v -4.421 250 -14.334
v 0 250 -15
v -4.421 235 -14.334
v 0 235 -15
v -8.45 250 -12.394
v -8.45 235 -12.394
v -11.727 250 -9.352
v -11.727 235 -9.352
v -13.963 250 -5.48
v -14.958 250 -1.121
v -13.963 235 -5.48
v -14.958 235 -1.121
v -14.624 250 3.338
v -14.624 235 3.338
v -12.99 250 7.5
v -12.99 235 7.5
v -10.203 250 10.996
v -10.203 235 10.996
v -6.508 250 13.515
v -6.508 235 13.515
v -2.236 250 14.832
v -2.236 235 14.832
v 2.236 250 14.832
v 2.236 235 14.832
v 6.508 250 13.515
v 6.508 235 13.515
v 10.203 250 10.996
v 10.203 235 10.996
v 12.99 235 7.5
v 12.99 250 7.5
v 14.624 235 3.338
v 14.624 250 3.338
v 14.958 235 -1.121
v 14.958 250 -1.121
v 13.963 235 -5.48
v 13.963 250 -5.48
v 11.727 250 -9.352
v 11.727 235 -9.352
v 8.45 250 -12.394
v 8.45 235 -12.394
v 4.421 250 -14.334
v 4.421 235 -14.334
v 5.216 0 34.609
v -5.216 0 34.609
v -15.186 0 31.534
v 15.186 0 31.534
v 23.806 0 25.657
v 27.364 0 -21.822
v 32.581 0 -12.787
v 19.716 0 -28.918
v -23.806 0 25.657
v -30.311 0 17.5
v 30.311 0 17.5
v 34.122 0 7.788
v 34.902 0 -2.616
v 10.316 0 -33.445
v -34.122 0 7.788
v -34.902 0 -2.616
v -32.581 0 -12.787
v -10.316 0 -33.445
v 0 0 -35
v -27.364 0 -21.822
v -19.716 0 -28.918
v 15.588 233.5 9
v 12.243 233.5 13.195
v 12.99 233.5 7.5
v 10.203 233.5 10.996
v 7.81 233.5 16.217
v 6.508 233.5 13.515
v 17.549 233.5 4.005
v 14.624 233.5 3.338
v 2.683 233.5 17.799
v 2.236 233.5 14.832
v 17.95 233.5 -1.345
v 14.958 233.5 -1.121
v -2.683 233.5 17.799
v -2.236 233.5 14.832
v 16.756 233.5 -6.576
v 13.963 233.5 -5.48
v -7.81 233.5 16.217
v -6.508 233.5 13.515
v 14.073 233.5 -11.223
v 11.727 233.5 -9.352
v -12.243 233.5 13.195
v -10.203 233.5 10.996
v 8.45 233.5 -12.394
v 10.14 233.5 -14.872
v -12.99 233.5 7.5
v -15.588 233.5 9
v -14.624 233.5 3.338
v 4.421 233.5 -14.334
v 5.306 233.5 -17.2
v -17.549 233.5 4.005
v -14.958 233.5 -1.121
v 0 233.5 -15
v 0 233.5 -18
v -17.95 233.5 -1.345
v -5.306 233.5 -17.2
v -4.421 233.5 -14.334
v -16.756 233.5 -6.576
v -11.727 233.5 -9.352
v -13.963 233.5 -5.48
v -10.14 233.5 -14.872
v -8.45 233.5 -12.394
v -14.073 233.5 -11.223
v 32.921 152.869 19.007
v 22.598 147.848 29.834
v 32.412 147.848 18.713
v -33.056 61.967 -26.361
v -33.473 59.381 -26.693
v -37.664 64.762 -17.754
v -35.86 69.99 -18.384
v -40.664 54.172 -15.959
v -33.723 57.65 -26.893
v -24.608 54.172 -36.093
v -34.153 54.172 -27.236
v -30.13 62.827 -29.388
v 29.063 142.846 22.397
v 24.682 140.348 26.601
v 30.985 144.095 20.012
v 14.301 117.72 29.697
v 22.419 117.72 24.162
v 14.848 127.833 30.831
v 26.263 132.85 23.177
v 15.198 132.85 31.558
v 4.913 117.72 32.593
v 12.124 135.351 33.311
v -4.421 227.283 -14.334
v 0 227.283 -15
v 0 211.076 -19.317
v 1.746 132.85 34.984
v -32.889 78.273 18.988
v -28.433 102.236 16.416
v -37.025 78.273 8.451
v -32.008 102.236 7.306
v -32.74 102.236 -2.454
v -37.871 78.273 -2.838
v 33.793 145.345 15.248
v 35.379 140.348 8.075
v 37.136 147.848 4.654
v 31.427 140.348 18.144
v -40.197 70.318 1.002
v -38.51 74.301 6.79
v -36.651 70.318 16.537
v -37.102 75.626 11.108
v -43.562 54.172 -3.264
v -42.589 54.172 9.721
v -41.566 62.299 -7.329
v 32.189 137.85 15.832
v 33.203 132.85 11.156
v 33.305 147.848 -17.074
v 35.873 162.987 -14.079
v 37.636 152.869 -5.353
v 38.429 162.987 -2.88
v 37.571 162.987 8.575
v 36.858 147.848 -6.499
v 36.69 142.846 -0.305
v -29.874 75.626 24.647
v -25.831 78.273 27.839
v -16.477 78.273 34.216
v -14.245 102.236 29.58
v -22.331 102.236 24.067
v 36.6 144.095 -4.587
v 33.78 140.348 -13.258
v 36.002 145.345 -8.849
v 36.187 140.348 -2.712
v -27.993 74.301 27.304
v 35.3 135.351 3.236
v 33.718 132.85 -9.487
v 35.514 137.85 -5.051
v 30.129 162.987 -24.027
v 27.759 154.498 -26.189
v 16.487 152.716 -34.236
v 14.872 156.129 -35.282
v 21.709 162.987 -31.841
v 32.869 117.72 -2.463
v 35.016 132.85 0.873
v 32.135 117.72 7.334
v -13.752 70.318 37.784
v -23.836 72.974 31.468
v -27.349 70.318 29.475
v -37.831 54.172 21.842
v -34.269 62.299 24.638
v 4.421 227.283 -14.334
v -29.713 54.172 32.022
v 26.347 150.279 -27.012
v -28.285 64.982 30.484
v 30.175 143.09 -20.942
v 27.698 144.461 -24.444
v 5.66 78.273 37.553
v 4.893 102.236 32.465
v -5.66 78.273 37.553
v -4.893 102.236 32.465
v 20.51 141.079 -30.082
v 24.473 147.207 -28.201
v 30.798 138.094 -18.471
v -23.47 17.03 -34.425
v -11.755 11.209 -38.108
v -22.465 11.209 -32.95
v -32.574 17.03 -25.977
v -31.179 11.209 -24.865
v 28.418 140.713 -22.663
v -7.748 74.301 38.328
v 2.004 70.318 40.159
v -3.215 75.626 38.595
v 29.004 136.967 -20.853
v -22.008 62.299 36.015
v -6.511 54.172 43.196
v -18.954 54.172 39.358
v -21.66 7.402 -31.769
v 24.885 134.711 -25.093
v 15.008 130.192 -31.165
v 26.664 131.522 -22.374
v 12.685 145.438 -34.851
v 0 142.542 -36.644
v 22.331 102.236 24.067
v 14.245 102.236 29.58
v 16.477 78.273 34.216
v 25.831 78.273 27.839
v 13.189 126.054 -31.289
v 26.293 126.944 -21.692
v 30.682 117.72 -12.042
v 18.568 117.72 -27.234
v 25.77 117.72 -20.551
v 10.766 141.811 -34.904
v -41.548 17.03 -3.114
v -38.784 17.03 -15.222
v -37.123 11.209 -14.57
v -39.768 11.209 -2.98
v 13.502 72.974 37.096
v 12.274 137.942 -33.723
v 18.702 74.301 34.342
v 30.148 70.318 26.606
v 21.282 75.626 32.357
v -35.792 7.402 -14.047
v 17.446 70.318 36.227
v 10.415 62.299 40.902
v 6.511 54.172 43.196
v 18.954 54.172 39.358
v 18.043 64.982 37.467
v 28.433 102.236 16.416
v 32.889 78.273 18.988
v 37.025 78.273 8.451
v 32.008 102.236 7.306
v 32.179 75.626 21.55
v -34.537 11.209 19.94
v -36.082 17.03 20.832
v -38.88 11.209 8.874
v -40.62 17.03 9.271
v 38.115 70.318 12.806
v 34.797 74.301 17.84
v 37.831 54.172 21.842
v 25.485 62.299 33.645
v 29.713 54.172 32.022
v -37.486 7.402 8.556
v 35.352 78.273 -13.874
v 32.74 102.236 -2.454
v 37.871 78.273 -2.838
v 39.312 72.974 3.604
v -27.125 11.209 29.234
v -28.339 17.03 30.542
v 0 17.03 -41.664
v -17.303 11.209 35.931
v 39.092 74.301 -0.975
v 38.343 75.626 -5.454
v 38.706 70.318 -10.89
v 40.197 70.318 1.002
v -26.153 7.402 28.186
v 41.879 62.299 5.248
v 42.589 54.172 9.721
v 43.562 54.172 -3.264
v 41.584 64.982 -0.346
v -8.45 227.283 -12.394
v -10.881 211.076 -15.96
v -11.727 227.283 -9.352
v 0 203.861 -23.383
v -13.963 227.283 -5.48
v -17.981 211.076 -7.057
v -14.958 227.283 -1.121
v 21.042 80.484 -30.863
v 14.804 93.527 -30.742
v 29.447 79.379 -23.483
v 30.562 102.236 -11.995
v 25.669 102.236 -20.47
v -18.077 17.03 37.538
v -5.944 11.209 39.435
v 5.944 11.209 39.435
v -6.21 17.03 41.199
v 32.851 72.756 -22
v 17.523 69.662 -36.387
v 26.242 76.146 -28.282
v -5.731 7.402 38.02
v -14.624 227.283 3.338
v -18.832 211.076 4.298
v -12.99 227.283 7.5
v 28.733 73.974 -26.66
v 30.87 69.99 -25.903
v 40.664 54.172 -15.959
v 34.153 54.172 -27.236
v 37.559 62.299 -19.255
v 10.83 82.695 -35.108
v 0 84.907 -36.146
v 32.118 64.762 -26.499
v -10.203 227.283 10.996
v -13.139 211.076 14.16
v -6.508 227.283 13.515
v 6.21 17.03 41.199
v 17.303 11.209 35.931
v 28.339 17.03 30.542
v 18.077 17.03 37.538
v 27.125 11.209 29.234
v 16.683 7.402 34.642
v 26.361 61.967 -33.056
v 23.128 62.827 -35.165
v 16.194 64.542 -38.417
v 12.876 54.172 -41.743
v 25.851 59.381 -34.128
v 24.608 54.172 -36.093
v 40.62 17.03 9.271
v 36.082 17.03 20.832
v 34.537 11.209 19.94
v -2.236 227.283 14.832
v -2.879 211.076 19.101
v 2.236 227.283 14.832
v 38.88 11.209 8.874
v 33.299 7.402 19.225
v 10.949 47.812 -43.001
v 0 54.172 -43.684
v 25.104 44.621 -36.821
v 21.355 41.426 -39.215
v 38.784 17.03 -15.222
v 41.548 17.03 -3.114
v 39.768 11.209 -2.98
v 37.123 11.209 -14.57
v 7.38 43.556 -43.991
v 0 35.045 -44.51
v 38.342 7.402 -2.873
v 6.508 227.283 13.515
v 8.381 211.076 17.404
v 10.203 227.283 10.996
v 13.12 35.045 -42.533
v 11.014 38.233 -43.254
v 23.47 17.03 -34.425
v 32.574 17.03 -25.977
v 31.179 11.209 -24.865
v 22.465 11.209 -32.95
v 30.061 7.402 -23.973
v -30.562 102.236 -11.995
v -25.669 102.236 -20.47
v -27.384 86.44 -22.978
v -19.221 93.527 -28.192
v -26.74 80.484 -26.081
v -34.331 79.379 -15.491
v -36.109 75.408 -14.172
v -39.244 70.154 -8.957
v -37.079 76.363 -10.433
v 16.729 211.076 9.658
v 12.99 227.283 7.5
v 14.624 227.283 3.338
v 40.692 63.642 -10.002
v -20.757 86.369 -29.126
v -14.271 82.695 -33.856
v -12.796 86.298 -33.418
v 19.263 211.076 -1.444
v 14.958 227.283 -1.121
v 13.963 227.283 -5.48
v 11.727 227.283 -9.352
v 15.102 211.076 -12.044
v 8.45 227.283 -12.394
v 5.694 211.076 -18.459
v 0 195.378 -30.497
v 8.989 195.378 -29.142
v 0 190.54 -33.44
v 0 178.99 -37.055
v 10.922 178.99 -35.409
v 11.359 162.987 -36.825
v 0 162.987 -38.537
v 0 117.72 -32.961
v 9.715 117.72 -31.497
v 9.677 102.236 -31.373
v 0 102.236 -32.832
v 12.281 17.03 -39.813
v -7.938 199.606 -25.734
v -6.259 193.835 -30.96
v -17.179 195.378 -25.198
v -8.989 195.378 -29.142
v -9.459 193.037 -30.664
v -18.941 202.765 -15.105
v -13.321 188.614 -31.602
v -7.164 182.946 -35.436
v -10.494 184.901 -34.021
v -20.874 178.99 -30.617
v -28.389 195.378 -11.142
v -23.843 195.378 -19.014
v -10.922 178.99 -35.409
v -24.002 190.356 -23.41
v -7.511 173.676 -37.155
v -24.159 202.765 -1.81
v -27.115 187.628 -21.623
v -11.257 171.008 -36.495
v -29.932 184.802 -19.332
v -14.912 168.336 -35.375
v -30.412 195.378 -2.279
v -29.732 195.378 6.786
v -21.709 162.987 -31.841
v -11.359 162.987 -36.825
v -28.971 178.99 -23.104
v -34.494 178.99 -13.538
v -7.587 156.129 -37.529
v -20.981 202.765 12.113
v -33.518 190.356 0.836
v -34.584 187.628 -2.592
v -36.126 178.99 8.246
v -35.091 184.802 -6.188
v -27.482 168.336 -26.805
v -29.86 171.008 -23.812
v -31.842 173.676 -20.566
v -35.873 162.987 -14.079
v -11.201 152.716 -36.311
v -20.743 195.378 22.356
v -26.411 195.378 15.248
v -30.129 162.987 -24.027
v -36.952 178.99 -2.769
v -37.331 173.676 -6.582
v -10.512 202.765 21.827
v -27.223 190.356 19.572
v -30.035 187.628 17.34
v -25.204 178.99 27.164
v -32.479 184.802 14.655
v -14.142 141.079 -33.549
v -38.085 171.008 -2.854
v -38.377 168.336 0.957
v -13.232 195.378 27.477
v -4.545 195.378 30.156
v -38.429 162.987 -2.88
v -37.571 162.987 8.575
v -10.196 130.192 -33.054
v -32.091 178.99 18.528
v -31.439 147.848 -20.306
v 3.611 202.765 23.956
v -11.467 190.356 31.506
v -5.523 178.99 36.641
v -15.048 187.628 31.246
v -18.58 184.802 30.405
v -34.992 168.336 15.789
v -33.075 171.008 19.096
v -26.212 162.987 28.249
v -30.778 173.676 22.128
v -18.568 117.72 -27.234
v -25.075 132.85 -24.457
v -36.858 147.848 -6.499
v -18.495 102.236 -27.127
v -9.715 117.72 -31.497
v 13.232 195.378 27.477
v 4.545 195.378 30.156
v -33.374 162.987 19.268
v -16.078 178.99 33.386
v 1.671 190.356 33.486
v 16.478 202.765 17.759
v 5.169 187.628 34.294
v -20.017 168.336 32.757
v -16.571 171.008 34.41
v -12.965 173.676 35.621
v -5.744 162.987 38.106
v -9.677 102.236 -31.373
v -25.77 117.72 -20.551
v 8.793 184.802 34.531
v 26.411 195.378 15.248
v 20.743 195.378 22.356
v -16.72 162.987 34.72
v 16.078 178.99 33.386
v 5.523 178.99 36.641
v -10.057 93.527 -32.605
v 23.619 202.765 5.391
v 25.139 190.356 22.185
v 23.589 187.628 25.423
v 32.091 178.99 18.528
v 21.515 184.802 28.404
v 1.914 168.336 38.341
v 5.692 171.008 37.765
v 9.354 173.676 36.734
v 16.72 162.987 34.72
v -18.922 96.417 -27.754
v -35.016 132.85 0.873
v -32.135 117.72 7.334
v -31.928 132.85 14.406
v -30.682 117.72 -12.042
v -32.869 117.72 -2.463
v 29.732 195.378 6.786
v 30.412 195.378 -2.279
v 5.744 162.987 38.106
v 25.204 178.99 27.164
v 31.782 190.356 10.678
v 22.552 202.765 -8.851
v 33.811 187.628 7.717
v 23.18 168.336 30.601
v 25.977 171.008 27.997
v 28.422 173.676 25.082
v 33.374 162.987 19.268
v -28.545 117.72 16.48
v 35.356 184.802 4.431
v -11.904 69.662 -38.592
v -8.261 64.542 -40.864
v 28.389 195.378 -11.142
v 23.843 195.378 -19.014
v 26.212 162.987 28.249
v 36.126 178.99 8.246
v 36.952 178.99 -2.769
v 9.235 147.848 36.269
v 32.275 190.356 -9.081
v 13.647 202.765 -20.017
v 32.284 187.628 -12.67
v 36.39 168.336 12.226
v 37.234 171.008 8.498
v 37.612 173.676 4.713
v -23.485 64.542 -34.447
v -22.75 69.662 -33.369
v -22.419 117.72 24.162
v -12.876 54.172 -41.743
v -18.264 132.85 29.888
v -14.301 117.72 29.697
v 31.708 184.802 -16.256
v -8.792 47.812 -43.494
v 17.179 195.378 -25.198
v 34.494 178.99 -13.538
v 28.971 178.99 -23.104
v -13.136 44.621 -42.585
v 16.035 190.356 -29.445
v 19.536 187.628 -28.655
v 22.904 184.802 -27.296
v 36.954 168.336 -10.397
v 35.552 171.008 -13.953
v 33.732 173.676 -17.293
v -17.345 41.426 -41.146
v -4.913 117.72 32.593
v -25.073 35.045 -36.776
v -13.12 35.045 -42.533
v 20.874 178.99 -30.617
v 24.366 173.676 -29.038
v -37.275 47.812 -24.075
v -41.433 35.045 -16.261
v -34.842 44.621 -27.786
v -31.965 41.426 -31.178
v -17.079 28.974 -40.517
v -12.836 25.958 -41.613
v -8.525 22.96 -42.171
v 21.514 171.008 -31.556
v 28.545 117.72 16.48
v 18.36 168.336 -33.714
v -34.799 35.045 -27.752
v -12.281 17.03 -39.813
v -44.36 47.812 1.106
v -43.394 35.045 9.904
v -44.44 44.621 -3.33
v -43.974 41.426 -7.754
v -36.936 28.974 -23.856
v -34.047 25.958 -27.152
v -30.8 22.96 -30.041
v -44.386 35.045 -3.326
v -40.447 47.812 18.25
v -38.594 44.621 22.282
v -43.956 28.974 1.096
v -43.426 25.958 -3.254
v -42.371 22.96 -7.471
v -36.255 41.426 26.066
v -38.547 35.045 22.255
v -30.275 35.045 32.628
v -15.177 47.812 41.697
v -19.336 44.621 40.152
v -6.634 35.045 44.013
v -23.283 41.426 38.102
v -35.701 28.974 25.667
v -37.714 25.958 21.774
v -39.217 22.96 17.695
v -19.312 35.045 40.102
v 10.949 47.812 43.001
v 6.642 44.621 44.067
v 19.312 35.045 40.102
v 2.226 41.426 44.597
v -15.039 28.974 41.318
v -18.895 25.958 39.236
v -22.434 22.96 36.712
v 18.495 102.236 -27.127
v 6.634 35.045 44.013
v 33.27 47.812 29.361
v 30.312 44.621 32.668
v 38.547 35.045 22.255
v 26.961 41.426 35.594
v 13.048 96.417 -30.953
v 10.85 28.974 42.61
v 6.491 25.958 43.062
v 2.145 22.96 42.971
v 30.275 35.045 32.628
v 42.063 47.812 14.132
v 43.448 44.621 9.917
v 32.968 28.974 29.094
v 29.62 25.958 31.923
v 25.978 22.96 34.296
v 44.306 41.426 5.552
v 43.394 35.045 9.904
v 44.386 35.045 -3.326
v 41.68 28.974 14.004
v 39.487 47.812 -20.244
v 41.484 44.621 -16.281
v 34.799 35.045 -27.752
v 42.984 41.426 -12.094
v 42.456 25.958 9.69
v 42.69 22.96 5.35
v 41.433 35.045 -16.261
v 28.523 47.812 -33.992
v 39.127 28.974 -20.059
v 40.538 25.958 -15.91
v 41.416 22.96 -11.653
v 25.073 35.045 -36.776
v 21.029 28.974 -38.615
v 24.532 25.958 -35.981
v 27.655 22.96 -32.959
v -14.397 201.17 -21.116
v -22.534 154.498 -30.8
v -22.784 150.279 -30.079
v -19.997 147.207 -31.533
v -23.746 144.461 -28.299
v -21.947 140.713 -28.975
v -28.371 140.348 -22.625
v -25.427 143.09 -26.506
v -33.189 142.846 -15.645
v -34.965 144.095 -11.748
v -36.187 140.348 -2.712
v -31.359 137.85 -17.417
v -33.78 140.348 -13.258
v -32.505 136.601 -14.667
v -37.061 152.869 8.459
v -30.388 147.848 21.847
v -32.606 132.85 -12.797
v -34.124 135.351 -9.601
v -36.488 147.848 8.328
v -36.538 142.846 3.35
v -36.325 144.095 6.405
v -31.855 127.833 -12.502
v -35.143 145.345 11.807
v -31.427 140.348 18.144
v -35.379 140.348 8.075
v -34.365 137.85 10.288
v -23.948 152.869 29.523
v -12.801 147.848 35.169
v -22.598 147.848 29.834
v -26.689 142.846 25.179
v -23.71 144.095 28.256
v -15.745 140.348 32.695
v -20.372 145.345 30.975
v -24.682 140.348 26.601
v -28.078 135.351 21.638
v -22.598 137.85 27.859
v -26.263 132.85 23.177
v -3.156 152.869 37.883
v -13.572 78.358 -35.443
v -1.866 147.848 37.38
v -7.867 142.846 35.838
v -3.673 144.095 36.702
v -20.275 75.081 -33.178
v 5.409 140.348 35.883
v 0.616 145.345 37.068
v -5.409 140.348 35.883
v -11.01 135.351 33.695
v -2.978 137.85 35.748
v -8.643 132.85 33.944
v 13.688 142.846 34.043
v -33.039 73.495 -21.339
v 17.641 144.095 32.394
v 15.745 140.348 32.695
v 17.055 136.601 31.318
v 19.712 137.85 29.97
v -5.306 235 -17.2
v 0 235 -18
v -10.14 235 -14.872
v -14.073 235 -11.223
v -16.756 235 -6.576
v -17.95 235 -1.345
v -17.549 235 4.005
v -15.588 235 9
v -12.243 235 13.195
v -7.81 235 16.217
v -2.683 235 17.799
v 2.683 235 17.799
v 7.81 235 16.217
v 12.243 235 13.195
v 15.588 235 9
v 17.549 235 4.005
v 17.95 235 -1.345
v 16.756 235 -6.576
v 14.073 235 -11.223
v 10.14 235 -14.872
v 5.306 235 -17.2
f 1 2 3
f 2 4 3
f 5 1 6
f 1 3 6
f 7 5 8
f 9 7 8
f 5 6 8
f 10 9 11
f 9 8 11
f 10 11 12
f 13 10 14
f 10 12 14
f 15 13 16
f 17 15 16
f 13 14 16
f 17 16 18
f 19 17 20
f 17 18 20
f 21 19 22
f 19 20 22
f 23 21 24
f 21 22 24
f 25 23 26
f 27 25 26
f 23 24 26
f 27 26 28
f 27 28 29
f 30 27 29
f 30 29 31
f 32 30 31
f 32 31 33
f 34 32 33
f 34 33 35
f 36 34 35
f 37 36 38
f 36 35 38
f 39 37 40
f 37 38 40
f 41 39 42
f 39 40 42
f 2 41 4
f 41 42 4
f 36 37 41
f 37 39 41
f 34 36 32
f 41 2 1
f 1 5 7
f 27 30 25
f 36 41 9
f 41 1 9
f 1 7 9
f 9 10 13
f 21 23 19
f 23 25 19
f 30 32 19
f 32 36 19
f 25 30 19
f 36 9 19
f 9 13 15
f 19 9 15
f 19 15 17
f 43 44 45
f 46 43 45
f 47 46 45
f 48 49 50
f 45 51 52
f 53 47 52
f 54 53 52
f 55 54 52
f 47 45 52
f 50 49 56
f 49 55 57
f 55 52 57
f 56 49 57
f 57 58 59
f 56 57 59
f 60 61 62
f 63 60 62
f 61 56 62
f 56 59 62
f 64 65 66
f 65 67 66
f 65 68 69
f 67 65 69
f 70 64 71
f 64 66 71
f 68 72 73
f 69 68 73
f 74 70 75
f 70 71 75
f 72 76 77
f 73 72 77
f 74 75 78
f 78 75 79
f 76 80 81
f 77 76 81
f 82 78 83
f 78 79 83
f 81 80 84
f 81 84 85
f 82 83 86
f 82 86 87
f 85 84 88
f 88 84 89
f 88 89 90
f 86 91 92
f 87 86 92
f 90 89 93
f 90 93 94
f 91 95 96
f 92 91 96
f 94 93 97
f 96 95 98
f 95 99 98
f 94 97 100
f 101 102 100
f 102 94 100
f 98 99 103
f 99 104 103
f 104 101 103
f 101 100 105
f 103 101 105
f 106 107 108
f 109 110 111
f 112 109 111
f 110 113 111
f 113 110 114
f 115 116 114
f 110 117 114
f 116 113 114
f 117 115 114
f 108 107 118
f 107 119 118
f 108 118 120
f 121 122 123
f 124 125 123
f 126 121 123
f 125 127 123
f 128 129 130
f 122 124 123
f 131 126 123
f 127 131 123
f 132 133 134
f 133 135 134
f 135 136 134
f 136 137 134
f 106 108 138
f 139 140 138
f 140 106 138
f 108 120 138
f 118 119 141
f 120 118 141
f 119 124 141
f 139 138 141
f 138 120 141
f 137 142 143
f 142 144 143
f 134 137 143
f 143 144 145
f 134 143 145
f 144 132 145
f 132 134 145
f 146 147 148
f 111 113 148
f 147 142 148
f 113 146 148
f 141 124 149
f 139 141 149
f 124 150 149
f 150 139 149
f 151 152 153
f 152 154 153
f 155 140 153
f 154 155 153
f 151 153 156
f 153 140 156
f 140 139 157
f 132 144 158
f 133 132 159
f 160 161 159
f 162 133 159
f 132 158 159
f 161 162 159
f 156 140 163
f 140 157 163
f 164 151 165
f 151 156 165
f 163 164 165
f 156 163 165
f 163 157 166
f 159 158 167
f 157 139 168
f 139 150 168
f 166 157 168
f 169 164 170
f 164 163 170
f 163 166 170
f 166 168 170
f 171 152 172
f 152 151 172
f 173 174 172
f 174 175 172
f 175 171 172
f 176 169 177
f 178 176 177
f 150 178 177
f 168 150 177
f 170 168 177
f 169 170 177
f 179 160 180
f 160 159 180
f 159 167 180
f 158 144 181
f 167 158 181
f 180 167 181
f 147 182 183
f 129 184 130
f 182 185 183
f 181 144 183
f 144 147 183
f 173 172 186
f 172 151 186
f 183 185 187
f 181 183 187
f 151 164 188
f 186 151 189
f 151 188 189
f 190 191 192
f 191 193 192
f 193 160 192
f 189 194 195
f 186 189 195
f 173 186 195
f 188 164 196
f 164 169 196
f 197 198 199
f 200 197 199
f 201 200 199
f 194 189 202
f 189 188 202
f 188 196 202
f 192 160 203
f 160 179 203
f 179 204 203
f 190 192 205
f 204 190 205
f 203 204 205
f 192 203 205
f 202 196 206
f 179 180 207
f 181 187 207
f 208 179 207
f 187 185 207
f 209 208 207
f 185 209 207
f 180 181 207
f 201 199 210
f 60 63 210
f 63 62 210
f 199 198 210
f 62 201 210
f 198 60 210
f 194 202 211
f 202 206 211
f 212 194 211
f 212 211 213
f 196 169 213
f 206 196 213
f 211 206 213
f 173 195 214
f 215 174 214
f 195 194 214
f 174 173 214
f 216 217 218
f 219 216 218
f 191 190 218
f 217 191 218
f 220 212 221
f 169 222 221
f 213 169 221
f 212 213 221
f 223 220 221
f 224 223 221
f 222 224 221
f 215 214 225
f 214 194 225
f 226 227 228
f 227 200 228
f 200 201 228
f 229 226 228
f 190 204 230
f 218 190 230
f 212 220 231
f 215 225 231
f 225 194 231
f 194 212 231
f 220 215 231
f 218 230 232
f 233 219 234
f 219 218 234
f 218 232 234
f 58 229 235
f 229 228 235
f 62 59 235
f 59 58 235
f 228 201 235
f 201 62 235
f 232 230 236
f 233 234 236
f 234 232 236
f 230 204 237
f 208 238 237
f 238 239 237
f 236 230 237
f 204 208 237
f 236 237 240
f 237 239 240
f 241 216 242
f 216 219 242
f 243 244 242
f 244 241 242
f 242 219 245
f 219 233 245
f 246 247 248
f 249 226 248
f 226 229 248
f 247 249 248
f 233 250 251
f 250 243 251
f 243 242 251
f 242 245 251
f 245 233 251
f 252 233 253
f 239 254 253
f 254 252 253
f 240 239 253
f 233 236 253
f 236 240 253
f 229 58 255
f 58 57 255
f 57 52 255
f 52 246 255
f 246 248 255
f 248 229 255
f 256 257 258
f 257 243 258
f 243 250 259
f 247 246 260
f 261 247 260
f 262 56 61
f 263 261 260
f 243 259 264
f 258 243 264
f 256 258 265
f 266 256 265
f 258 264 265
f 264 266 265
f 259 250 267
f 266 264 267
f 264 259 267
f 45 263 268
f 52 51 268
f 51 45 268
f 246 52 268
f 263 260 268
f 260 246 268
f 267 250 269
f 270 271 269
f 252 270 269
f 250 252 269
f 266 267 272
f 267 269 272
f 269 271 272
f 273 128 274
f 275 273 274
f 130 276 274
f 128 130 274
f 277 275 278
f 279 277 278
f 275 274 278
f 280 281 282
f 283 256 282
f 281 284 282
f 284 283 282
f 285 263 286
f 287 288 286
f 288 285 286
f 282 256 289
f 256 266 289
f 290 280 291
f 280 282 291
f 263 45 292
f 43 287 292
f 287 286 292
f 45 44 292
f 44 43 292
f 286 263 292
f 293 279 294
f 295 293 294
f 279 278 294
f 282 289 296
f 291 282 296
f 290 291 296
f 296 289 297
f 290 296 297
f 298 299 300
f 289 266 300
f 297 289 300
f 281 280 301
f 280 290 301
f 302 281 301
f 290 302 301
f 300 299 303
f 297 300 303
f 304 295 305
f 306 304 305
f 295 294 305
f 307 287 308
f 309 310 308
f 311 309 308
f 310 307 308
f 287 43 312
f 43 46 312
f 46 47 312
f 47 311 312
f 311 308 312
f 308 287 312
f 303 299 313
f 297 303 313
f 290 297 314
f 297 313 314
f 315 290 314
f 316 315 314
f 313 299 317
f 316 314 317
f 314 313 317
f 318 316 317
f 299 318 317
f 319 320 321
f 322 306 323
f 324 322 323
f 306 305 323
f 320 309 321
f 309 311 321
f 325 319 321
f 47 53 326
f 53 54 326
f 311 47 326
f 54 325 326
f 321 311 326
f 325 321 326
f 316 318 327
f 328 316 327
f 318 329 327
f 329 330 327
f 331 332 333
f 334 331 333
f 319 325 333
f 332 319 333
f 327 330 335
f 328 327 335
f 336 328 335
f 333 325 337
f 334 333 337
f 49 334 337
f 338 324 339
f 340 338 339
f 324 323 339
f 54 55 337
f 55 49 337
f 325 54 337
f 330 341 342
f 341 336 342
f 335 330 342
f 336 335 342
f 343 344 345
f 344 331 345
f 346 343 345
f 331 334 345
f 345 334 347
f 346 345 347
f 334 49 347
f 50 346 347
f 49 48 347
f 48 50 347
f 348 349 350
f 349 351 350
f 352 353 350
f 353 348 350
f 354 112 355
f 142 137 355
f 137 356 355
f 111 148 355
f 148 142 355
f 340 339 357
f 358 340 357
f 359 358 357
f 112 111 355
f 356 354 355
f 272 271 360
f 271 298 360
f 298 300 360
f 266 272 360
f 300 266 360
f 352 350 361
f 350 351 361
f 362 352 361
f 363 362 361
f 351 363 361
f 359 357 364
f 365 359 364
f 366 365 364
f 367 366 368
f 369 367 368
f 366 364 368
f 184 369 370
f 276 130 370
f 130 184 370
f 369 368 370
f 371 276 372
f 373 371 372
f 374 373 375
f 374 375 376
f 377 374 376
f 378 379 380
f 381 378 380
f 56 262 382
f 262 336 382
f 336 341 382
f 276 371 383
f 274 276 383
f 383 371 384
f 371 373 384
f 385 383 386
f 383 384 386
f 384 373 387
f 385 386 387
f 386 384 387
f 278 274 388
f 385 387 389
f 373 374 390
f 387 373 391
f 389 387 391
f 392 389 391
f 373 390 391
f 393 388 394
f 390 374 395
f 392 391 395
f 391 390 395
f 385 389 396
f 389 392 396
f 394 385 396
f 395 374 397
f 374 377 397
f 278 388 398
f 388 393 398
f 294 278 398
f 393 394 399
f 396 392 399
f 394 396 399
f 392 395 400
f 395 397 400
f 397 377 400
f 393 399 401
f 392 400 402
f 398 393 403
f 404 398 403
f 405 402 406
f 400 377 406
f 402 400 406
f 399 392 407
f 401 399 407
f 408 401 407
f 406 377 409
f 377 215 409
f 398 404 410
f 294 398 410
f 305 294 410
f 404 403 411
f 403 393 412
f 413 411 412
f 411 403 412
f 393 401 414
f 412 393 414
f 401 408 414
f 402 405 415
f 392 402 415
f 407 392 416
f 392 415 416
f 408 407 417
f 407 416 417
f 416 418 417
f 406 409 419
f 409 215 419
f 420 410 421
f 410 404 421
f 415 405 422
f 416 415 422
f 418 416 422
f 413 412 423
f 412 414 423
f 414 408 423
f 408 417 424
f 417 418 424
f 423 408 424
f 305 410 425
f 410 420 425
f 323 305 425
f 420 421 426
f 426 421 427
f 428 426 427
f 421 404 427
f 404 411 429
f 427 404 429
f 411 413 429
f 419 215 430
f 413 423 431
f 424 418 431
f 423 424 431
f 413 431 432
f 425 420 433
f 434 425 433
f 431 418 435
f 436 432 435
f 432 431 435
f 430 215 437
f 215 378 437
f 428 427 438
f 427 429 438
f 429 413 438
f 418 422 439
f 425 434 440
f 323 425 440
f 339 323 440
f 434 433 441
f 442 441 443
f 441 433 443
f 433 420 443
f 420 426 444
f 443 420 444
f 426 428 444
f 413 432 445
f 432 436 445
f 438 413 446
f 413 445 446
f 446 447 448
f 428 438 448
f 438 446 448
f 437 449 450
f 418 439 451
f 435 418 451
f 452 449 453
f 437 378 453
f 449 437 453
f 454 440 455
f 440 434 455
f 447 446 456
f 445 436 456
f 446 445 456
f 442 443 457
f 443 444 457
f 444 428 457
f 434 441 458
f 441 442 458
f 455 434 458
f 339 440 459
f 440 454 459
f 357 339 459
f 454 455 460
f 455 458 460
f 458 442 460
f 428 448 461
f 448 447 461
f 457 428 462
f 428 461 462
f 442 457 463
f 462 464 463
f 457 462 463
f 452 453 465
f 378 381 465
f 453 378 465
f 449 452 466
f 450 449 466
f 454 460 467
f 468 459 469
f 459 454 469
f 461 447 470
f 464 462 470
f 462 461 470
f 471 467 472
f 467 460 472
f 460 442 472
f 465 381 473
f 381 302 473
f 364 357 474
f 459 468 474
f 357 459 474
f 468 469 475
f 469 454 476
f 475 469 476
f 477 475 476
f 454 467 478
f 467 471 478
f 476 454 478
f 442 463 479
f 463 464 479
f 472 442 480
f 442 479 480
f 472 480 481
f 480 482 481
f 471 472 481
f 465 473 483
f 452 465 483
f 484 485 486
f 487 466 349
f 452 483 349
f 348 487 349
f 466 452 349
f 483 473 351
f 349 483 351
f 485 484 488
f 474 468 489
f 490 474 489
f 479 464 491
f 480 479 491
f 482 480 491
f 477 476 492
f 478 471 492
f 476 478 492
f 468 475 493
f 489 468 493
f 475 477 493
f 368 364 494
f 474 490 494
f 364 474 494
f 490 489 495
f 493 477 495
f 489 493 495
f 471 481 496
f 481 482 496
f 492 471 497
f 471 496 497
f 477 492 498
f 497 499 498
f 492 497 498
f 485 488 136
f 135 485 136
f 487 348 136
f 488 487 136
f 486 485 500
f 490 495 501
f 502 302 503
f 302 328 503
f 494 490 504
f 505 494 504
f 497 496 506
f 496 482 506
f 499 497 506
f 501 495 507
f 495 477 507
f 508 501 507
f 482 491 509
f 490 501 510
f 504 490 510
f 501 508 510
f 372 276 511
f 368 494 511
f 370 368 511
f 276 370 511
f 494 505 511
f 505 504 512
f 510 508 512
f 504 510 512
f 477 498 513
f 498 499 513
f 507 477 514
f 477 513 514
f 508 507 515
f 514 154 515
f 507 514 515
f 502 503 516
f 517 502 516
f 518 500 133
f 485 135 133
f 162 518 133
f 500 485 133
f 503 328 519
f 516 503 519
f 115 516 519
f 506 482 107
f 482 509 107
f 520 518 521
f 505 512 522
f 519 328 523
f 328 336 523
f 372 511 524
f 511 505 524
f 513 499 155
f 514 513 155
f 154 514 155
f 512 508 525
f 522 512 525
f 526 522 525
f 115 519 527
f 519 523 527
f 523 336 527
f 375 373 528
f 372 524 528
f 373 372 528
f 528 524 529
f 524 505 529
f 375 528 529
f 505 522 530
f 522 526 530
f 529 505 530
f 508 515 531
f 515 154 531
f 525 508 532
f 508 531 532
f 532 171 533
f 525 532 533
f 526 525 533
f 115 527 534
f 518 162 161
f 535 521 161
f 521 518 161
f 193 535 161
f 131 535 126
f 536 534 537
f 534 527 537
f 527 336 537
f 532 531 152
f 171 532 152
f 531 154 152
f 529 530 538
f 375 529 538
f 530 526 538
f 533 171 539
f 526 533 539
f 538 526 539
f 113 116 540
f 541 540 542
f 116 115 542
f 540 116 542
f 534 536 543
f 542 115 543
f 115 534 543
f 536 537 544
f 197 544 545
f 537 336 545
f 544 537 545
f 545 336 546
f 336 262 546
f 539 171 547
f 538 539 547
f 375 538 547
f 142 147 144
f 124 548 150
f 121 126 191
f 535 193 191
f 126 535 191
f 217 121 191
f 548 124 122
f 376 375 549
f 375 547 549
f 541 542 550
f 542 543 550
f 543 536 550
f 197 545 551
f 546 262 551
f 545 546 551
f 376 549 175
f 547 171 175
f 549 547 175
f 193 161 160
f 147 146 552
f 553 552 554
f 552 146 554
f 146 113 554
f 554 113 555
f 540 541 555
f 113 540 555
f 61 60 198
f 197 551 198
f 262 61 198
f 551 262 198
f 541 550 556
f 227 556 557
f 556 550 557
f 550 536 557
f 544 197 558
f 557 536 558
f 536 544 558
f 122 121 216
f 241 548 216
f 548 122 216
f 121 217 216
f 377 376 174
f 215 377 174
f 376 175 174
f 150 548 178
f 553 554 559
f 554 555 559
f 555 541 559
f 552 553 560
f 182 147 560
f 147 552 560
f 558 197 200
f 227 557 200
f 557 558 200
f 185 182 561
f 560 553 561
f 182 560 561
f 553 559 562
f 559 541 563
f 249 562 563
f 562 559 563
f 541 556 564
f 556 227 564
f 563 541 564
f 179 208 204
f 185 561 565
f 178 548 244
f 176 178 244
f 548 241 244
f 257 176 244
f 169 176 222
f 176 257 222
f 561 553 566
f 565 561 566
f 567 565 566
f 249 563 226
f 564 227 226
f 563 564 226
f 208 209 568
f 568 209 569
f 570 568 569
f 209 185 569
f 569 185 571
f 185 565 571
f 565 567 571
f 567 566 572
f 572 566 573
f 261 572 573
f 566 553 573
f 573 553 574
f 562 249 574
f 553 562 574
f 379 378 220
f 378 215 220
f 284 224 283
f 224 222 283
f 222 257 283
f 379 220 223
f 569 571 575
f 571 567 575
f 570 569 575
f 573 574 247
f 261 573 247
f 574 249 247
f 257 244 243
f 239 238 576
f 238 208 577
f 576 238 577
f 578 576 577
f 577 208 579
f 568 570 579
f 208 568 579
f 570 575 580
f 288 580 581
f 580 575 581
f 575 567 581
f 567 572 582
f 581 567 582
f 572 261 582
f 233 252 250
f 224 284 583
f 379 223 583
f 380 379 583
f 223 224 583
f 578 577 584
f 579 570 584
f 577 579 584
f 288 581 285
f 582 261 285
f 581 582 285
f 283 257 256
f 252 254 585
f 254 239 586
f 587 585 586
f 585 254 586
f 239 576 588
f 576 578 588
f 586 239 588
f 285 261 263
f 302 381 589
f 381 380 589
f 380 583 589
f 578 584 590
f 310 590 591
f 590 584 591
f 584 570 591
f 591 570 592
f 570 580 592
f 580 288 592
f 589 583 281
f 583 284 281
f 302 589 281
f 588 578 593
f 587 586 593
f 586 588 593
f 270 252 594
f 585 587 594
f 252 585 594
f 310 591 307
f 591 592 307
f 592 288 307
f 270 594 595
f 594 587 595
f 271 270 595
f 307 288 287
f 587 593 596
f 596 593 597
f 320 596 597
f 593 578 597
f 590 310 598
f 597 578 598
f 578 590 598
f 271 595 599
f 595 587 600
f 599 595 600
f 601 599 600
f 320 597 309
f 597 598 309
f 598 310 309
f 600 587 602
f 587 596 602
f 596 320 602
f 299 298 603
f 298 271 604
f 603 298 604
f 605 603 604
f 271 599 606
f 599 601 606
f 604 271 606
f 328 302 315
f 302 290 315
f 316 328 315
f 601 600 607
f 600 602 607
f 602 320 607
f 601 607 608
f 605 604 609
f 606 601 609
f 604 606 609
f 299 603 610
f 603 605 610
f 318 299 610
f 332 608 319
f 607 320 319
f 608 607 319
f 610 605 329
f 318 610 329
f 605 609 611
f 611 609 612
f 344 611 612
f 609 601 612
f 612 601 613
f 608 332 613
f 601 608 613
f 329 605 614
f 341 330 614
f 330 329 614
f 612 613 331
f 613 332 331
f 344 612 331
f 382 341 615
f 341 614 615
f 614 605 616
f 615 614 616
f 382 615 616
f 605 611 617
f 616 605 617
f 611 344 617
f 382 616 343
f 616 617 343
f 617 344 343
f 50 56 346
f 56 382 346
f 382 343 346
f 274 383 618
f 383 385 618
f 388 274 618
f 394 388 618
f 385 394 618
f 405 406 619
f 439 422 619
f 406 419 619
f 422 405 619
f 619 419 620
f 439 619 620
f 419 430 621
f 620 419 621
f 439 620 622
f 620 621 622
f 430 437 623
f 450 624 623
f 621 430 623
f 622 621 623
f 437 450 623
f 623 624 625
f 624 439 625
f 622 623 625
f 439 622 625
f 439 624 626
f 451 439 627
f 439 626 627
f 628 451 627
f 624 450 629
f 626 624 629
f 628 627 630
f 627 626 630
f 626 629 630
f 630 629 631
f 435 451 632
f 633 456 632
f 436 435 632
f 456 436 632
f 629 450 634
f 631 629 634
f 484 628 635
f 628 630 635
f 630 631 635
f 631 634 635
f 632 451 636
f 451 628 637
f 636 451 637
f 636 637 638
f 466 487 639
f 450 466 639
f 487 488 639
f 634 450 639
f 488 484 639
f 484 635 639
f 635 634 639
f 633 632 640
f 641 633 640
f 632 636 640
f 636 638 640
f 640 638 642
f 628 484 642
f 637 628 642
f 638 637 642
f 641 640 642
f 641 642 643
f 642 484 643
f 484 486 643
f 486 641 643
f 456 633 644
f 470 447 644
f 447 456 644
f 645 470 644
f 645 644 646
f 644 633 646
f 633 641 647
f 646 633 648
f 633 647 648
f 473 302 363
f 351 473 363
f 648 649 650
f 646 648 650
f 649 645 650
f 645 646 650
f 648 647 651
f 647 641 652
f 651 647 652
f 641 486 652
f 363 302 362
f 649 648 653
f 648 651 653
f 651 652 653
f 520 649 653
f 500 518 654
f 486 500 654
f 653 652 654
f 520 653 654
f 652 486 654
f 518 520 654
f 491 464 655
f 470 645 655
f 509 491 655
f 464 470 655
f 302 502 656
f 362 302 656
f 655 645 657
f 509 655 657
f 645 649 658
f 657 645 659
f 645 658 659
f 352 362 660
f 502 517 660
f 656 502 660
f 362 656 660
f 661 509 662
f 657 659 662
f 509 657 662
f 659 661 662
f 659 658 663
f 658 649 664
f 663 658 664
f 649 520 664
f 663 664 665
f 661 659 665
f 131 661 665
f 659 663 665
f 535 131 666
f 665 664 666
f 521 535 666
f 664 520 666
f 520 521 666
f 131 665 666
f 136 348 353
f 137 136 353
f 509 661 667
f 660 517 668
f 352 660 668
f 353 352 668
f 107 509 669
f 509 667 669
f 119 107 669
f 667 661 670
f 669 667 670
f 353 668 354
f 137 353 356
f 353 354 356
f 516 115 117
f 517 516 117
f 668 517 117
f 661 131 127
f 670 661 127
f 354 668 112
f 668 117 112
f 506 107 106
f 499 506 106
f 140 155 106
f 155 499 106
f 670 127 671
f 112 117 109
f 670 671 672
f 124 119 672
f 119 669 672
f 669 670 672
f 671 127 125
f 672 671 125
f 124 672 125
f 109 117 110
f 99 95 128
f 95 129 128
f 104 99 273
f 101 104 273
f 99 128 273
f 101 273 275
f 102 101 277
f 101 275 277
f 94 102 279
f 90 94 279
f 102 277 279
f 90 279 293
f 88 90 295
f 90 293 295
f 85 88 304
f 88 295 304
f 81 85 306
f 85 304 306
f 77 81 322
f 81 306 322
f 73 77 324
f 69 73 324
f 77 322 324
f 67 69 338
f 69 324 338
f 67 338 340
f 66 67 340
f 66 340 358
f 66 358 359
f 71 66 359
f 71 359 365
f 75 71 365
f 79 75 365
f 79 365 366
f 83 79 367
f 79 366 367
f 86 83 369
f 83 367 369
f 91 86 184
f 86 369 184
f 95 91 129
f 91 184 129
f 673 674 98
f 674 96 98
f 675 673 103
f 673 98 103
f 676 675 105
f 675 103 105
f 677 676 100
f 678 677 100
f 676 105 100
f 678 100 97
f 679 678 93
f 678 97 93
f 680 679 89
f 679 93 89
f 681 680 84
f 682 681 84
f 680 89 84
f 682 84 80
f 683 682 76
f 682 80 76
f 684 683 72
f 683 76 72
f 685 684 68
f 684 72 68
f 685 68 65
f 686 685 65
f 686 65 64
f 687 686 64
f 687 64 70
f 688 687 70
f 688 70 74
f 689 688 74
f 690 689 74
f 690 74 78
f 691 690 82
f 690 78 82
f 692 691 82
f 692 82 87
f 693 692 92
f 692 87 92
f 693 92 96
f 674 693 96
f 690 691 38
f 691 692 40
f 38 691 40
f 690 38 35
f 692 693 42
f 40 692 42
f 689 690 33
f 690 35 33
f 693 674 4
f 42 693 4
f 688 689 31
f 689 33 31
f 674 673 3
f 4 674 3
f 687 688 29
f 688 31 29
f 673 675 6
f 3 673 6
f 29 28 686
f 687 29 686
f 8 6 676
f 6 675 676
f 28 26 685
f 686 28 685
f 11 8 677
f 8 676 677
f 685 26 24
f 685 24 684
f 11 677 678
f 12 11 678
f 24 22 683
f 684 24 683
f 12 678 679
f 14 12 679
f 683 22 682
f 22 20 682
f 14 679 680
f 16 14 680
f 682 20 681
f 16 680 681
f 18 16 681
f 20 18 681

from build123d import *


with BuildPart() as part:
    # Croquis1 → Revolución1 (revolve)
    with BuildSketch(Plane.XY, mode=Mode.PRIVATE) as revoluci_n1_sk:
        with BuildLine():
            Line((0, 250), (-15, 250))
            Line((-15, 250), (-15, 235))
            Line((-15, 235), (-18, 235))
            Line((-18, 235), (-18, 233.5))
            Line((-18, 233.5), (-15, 233.5))
            Line((-15, 233.5), (-15, 227.283149652))
            add(Edge.make_bspline(
                [(-15, 227.283149652), (-16.277986715, 219.305420885), (-19.489344326, 206.260916929), (-32.684348565, 194.323220301), (-38.547275622, 176.702280824), (-39.162662254, 152.86461741), (-33.561571476, 127.462649854), (-30.990721493, 94.977950046), (-48.241664637, 54.863367585), (-44.557007193, 17.989663347), (-35, 0)],
                knots=[0, 0, 0, 0, 0.105527687, 0.159807734, 0.221005565, 0.335010102, 0.459707985, 0.552192154, 0.743984647, 1, 1, 1, 1], degree=3))
            Line((-35, 0), (0, 0))
            Line((0, 0), (0, 250))
        make_face()
    revolve(revoluci_n1_sk.sketch.rotate(Axis((0, 0, 0), (0, 1, 0)), 270), axis=Axis((0, 0, 0), (0, 1, 0)))


solid = part.part
